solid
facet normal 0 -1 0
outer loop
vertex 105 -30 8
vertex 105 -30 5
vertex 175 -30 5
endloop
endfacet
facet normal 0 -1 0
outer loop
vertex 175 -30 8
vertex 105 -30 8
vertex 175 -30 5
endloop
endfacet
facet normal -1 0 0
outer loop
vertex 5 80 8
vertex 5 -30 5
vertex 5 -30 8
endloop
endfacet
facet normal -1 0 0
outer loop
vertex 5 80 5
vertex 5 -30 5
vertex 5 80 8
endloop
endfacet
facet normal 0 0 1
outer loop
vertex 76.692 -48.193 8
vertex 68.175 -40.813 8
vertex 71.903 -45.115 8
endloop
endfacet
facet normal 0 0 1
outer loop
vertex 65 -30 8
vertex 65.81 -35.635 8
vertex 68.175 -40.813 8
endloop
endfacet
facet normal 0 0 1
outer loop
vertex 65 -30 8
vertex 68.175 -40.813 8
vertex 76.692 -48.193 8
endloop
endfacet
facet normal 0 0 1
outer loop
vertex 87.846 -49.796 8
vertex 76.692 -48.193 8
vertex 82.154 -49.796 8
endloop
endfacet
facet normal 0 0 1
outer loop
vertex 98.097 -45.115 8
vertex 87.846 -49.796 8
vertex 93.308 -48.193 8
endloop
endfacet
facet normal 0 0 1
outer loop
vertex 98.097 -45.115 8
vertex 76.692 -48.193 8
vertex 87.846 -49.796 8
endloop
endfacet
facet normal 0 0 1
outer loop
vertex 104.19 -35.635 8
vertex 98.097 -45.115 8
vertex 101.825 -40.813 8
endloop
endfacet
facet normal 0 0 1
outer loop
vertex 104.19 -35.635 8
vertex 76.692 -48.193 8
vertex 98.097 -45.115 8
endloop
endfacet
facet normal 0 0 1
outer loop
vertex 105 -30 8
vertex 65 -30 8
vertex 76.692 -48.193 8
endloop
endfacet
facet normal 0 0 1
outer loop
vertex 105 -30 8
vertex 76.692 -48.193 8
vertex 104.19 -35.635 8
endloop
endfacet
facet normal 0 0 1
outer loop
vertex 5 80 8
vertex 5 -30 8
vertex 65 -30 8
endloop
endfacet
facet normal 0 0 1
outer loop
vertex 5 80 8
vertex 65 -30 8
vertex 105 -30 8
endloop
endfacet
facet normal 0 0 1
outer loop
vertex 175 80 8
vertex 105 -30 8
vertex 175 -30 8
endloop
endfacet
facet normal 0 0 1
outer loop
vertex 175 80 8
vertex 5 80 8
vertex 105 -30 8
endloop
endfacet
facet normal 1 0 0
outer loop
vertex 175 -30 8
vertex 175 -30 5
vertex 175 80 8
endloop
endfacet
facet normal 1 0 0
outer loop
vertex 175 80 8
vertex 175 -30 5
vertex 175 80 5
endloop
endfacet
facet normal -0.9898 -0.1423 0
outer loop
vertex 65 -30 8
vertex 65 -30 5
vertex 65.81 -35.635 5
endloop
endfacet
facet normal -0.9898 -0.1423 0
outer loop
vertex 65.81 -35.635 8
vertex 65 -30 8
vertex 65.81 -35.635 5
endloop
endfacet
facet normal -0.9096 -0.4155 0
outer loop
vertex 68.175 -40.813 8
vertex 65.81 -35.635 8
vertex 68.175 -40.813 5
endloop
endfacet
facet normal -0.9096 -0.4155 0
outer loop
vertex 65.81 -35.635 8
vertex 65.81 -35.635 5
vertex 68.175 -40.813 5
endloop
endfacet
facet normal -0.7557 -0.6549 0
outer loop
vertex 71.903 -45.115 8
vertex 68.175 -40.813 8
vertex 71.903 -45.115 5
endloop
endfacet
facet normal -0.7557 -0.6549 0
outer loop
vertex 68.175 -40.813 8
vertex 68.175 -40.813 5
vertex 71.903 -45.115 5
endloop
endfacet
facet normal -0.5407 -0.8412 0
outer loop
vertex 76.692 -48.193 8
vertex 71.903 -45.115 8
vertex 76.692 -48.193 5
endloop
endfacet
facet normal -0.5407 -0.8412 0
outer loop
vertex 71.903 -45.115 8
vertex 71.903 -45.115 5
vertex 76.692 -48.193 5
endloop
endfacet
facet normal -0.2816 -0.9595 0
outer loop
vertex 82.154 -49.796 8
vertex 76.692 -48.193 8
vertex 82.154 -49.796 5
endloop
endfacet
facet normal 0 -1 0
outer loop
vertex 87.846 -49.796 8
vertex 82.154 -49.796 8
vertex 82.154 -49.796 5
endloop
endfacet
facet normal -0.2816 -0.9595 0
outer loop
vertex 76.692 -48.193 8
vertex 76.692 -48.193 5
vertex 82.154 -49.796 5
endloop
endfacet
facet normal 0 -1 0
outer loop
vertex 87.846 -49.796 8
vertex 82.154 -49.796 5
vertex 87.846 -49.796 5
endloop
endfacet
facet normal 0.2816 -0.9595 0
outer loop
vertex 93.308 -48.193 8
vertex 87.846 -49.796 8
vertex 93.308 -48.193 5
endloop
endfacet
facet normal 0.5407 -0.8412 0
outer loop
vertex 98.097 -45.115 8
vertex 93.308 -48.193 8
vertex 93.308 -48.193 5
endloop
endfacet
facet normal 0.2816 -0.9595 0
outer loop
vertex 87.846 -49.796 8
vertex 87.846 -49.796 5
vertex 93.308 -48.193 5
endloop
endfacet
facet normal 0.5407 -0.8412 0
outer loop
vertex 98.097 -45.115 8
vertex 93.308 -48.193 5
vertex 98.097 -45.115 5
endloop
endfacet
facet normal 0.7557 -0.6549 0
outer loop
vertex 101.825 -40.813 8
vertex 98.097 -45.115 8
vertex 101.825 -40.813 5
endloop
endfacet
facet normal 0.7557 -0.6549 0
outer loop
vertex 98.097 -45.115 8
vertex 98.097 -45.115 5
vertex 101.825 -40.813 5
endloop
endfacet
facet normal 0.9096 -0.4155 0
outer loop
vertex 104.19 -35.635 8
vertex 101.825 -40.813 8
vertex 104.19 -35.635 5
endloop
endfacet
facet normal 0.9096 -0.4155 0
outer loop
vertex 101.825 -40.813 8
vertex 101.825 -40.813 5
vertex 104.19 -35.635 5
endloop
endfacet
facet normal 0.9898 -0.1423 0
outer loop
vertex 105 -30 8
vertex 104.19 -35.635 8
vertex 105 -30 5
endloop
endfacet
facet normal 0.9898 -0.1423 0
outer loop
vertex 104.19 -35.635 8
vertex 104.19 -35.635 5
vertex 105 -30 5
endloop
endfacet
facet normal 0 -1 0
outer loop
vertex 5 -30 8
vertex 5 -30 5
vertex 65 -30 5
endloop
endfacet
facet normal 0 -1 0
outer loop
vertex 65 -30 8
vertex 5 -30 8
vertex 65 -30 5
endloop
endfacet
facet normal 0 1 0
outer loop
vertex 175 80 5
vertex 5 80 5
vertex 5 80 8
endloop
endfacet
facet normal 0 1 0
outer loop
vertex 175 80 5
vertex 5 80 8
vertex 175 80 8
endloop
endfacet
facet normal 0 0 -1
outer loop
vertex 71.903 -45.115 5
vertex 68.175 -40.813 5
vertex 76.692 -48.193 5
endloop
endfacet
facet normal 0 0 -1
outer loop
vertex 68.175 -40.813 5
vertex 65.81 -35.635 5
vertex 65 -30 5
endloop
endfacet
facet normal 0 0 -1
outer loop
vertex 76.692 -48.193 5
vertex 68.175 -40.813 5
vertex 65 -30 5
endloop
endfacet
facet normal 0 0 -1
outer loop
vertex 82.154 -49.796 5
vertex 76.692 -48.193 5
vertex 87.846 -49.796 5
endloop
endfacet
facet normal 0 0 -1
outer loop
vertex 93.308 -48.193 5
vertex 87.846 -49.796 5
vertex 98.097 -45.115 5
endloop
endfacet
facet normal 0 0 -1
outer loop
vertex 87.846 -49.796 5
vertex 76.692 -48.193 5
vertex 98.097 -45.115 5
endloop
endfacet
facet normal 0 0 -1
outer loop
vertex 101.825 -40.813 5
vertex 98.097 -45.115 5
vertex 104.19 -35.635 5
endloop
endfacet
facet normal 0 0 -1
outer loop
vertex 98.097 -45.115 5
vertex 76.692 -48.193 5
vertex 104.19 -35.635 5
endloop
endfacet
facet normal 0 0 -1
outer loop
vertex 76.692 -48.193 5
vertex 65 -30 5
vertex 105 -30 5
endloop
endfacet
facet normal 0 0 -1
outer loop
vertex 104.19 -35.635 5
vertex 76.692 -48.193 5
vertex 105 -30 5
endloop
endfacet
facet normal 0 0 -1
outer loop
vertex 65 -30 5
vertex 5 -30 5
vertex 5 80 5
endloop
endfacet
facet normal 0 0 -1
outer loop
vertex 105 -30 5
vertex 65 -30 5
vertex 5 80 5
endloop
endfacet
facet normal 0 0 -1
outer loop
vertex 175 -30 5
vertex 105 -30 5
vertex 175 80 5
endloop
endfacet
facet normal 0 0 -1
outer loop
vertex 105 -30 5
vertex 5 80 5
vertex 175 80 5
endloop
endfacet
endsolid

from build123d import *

# Parameters (mm, degrees)
CYLINDER_R     = 20
CYLINDER_DEPTH = 3
BOX002_W       = 170
BOX002_H       = 110
BOX002_DEPTH   = 3


with BuildPart() as cilindro:
    # Cylinder → Cylinder (new body)
    with BuildSketch(Plane(origin=(80, 0, 0), x_dir=(1, 0, 0), z_dir=(0, 0, 1))):
        Circle(CYLINDER_R)
    extrude(amount=CYLINDER_DEPTH)


with BuildPart() as metacrilato1:
    # Box002 → Box002 (new body)
    with BuildSketch(Plane.XY):
        with Locations((85, 55)):
            Rectangle(BOX002_W, BOX002_H)
    extrude(amount=BOX002_DEPTH)

    # Fusion: union Cilindro
    add(cilindro.part)


with BuildPart() as metacrilato1_1:
    # Fusion placement: moved
    add(metacrilato1.part.moved(Location((5, -30, 5))))


solid = metacrilato1_1.part
